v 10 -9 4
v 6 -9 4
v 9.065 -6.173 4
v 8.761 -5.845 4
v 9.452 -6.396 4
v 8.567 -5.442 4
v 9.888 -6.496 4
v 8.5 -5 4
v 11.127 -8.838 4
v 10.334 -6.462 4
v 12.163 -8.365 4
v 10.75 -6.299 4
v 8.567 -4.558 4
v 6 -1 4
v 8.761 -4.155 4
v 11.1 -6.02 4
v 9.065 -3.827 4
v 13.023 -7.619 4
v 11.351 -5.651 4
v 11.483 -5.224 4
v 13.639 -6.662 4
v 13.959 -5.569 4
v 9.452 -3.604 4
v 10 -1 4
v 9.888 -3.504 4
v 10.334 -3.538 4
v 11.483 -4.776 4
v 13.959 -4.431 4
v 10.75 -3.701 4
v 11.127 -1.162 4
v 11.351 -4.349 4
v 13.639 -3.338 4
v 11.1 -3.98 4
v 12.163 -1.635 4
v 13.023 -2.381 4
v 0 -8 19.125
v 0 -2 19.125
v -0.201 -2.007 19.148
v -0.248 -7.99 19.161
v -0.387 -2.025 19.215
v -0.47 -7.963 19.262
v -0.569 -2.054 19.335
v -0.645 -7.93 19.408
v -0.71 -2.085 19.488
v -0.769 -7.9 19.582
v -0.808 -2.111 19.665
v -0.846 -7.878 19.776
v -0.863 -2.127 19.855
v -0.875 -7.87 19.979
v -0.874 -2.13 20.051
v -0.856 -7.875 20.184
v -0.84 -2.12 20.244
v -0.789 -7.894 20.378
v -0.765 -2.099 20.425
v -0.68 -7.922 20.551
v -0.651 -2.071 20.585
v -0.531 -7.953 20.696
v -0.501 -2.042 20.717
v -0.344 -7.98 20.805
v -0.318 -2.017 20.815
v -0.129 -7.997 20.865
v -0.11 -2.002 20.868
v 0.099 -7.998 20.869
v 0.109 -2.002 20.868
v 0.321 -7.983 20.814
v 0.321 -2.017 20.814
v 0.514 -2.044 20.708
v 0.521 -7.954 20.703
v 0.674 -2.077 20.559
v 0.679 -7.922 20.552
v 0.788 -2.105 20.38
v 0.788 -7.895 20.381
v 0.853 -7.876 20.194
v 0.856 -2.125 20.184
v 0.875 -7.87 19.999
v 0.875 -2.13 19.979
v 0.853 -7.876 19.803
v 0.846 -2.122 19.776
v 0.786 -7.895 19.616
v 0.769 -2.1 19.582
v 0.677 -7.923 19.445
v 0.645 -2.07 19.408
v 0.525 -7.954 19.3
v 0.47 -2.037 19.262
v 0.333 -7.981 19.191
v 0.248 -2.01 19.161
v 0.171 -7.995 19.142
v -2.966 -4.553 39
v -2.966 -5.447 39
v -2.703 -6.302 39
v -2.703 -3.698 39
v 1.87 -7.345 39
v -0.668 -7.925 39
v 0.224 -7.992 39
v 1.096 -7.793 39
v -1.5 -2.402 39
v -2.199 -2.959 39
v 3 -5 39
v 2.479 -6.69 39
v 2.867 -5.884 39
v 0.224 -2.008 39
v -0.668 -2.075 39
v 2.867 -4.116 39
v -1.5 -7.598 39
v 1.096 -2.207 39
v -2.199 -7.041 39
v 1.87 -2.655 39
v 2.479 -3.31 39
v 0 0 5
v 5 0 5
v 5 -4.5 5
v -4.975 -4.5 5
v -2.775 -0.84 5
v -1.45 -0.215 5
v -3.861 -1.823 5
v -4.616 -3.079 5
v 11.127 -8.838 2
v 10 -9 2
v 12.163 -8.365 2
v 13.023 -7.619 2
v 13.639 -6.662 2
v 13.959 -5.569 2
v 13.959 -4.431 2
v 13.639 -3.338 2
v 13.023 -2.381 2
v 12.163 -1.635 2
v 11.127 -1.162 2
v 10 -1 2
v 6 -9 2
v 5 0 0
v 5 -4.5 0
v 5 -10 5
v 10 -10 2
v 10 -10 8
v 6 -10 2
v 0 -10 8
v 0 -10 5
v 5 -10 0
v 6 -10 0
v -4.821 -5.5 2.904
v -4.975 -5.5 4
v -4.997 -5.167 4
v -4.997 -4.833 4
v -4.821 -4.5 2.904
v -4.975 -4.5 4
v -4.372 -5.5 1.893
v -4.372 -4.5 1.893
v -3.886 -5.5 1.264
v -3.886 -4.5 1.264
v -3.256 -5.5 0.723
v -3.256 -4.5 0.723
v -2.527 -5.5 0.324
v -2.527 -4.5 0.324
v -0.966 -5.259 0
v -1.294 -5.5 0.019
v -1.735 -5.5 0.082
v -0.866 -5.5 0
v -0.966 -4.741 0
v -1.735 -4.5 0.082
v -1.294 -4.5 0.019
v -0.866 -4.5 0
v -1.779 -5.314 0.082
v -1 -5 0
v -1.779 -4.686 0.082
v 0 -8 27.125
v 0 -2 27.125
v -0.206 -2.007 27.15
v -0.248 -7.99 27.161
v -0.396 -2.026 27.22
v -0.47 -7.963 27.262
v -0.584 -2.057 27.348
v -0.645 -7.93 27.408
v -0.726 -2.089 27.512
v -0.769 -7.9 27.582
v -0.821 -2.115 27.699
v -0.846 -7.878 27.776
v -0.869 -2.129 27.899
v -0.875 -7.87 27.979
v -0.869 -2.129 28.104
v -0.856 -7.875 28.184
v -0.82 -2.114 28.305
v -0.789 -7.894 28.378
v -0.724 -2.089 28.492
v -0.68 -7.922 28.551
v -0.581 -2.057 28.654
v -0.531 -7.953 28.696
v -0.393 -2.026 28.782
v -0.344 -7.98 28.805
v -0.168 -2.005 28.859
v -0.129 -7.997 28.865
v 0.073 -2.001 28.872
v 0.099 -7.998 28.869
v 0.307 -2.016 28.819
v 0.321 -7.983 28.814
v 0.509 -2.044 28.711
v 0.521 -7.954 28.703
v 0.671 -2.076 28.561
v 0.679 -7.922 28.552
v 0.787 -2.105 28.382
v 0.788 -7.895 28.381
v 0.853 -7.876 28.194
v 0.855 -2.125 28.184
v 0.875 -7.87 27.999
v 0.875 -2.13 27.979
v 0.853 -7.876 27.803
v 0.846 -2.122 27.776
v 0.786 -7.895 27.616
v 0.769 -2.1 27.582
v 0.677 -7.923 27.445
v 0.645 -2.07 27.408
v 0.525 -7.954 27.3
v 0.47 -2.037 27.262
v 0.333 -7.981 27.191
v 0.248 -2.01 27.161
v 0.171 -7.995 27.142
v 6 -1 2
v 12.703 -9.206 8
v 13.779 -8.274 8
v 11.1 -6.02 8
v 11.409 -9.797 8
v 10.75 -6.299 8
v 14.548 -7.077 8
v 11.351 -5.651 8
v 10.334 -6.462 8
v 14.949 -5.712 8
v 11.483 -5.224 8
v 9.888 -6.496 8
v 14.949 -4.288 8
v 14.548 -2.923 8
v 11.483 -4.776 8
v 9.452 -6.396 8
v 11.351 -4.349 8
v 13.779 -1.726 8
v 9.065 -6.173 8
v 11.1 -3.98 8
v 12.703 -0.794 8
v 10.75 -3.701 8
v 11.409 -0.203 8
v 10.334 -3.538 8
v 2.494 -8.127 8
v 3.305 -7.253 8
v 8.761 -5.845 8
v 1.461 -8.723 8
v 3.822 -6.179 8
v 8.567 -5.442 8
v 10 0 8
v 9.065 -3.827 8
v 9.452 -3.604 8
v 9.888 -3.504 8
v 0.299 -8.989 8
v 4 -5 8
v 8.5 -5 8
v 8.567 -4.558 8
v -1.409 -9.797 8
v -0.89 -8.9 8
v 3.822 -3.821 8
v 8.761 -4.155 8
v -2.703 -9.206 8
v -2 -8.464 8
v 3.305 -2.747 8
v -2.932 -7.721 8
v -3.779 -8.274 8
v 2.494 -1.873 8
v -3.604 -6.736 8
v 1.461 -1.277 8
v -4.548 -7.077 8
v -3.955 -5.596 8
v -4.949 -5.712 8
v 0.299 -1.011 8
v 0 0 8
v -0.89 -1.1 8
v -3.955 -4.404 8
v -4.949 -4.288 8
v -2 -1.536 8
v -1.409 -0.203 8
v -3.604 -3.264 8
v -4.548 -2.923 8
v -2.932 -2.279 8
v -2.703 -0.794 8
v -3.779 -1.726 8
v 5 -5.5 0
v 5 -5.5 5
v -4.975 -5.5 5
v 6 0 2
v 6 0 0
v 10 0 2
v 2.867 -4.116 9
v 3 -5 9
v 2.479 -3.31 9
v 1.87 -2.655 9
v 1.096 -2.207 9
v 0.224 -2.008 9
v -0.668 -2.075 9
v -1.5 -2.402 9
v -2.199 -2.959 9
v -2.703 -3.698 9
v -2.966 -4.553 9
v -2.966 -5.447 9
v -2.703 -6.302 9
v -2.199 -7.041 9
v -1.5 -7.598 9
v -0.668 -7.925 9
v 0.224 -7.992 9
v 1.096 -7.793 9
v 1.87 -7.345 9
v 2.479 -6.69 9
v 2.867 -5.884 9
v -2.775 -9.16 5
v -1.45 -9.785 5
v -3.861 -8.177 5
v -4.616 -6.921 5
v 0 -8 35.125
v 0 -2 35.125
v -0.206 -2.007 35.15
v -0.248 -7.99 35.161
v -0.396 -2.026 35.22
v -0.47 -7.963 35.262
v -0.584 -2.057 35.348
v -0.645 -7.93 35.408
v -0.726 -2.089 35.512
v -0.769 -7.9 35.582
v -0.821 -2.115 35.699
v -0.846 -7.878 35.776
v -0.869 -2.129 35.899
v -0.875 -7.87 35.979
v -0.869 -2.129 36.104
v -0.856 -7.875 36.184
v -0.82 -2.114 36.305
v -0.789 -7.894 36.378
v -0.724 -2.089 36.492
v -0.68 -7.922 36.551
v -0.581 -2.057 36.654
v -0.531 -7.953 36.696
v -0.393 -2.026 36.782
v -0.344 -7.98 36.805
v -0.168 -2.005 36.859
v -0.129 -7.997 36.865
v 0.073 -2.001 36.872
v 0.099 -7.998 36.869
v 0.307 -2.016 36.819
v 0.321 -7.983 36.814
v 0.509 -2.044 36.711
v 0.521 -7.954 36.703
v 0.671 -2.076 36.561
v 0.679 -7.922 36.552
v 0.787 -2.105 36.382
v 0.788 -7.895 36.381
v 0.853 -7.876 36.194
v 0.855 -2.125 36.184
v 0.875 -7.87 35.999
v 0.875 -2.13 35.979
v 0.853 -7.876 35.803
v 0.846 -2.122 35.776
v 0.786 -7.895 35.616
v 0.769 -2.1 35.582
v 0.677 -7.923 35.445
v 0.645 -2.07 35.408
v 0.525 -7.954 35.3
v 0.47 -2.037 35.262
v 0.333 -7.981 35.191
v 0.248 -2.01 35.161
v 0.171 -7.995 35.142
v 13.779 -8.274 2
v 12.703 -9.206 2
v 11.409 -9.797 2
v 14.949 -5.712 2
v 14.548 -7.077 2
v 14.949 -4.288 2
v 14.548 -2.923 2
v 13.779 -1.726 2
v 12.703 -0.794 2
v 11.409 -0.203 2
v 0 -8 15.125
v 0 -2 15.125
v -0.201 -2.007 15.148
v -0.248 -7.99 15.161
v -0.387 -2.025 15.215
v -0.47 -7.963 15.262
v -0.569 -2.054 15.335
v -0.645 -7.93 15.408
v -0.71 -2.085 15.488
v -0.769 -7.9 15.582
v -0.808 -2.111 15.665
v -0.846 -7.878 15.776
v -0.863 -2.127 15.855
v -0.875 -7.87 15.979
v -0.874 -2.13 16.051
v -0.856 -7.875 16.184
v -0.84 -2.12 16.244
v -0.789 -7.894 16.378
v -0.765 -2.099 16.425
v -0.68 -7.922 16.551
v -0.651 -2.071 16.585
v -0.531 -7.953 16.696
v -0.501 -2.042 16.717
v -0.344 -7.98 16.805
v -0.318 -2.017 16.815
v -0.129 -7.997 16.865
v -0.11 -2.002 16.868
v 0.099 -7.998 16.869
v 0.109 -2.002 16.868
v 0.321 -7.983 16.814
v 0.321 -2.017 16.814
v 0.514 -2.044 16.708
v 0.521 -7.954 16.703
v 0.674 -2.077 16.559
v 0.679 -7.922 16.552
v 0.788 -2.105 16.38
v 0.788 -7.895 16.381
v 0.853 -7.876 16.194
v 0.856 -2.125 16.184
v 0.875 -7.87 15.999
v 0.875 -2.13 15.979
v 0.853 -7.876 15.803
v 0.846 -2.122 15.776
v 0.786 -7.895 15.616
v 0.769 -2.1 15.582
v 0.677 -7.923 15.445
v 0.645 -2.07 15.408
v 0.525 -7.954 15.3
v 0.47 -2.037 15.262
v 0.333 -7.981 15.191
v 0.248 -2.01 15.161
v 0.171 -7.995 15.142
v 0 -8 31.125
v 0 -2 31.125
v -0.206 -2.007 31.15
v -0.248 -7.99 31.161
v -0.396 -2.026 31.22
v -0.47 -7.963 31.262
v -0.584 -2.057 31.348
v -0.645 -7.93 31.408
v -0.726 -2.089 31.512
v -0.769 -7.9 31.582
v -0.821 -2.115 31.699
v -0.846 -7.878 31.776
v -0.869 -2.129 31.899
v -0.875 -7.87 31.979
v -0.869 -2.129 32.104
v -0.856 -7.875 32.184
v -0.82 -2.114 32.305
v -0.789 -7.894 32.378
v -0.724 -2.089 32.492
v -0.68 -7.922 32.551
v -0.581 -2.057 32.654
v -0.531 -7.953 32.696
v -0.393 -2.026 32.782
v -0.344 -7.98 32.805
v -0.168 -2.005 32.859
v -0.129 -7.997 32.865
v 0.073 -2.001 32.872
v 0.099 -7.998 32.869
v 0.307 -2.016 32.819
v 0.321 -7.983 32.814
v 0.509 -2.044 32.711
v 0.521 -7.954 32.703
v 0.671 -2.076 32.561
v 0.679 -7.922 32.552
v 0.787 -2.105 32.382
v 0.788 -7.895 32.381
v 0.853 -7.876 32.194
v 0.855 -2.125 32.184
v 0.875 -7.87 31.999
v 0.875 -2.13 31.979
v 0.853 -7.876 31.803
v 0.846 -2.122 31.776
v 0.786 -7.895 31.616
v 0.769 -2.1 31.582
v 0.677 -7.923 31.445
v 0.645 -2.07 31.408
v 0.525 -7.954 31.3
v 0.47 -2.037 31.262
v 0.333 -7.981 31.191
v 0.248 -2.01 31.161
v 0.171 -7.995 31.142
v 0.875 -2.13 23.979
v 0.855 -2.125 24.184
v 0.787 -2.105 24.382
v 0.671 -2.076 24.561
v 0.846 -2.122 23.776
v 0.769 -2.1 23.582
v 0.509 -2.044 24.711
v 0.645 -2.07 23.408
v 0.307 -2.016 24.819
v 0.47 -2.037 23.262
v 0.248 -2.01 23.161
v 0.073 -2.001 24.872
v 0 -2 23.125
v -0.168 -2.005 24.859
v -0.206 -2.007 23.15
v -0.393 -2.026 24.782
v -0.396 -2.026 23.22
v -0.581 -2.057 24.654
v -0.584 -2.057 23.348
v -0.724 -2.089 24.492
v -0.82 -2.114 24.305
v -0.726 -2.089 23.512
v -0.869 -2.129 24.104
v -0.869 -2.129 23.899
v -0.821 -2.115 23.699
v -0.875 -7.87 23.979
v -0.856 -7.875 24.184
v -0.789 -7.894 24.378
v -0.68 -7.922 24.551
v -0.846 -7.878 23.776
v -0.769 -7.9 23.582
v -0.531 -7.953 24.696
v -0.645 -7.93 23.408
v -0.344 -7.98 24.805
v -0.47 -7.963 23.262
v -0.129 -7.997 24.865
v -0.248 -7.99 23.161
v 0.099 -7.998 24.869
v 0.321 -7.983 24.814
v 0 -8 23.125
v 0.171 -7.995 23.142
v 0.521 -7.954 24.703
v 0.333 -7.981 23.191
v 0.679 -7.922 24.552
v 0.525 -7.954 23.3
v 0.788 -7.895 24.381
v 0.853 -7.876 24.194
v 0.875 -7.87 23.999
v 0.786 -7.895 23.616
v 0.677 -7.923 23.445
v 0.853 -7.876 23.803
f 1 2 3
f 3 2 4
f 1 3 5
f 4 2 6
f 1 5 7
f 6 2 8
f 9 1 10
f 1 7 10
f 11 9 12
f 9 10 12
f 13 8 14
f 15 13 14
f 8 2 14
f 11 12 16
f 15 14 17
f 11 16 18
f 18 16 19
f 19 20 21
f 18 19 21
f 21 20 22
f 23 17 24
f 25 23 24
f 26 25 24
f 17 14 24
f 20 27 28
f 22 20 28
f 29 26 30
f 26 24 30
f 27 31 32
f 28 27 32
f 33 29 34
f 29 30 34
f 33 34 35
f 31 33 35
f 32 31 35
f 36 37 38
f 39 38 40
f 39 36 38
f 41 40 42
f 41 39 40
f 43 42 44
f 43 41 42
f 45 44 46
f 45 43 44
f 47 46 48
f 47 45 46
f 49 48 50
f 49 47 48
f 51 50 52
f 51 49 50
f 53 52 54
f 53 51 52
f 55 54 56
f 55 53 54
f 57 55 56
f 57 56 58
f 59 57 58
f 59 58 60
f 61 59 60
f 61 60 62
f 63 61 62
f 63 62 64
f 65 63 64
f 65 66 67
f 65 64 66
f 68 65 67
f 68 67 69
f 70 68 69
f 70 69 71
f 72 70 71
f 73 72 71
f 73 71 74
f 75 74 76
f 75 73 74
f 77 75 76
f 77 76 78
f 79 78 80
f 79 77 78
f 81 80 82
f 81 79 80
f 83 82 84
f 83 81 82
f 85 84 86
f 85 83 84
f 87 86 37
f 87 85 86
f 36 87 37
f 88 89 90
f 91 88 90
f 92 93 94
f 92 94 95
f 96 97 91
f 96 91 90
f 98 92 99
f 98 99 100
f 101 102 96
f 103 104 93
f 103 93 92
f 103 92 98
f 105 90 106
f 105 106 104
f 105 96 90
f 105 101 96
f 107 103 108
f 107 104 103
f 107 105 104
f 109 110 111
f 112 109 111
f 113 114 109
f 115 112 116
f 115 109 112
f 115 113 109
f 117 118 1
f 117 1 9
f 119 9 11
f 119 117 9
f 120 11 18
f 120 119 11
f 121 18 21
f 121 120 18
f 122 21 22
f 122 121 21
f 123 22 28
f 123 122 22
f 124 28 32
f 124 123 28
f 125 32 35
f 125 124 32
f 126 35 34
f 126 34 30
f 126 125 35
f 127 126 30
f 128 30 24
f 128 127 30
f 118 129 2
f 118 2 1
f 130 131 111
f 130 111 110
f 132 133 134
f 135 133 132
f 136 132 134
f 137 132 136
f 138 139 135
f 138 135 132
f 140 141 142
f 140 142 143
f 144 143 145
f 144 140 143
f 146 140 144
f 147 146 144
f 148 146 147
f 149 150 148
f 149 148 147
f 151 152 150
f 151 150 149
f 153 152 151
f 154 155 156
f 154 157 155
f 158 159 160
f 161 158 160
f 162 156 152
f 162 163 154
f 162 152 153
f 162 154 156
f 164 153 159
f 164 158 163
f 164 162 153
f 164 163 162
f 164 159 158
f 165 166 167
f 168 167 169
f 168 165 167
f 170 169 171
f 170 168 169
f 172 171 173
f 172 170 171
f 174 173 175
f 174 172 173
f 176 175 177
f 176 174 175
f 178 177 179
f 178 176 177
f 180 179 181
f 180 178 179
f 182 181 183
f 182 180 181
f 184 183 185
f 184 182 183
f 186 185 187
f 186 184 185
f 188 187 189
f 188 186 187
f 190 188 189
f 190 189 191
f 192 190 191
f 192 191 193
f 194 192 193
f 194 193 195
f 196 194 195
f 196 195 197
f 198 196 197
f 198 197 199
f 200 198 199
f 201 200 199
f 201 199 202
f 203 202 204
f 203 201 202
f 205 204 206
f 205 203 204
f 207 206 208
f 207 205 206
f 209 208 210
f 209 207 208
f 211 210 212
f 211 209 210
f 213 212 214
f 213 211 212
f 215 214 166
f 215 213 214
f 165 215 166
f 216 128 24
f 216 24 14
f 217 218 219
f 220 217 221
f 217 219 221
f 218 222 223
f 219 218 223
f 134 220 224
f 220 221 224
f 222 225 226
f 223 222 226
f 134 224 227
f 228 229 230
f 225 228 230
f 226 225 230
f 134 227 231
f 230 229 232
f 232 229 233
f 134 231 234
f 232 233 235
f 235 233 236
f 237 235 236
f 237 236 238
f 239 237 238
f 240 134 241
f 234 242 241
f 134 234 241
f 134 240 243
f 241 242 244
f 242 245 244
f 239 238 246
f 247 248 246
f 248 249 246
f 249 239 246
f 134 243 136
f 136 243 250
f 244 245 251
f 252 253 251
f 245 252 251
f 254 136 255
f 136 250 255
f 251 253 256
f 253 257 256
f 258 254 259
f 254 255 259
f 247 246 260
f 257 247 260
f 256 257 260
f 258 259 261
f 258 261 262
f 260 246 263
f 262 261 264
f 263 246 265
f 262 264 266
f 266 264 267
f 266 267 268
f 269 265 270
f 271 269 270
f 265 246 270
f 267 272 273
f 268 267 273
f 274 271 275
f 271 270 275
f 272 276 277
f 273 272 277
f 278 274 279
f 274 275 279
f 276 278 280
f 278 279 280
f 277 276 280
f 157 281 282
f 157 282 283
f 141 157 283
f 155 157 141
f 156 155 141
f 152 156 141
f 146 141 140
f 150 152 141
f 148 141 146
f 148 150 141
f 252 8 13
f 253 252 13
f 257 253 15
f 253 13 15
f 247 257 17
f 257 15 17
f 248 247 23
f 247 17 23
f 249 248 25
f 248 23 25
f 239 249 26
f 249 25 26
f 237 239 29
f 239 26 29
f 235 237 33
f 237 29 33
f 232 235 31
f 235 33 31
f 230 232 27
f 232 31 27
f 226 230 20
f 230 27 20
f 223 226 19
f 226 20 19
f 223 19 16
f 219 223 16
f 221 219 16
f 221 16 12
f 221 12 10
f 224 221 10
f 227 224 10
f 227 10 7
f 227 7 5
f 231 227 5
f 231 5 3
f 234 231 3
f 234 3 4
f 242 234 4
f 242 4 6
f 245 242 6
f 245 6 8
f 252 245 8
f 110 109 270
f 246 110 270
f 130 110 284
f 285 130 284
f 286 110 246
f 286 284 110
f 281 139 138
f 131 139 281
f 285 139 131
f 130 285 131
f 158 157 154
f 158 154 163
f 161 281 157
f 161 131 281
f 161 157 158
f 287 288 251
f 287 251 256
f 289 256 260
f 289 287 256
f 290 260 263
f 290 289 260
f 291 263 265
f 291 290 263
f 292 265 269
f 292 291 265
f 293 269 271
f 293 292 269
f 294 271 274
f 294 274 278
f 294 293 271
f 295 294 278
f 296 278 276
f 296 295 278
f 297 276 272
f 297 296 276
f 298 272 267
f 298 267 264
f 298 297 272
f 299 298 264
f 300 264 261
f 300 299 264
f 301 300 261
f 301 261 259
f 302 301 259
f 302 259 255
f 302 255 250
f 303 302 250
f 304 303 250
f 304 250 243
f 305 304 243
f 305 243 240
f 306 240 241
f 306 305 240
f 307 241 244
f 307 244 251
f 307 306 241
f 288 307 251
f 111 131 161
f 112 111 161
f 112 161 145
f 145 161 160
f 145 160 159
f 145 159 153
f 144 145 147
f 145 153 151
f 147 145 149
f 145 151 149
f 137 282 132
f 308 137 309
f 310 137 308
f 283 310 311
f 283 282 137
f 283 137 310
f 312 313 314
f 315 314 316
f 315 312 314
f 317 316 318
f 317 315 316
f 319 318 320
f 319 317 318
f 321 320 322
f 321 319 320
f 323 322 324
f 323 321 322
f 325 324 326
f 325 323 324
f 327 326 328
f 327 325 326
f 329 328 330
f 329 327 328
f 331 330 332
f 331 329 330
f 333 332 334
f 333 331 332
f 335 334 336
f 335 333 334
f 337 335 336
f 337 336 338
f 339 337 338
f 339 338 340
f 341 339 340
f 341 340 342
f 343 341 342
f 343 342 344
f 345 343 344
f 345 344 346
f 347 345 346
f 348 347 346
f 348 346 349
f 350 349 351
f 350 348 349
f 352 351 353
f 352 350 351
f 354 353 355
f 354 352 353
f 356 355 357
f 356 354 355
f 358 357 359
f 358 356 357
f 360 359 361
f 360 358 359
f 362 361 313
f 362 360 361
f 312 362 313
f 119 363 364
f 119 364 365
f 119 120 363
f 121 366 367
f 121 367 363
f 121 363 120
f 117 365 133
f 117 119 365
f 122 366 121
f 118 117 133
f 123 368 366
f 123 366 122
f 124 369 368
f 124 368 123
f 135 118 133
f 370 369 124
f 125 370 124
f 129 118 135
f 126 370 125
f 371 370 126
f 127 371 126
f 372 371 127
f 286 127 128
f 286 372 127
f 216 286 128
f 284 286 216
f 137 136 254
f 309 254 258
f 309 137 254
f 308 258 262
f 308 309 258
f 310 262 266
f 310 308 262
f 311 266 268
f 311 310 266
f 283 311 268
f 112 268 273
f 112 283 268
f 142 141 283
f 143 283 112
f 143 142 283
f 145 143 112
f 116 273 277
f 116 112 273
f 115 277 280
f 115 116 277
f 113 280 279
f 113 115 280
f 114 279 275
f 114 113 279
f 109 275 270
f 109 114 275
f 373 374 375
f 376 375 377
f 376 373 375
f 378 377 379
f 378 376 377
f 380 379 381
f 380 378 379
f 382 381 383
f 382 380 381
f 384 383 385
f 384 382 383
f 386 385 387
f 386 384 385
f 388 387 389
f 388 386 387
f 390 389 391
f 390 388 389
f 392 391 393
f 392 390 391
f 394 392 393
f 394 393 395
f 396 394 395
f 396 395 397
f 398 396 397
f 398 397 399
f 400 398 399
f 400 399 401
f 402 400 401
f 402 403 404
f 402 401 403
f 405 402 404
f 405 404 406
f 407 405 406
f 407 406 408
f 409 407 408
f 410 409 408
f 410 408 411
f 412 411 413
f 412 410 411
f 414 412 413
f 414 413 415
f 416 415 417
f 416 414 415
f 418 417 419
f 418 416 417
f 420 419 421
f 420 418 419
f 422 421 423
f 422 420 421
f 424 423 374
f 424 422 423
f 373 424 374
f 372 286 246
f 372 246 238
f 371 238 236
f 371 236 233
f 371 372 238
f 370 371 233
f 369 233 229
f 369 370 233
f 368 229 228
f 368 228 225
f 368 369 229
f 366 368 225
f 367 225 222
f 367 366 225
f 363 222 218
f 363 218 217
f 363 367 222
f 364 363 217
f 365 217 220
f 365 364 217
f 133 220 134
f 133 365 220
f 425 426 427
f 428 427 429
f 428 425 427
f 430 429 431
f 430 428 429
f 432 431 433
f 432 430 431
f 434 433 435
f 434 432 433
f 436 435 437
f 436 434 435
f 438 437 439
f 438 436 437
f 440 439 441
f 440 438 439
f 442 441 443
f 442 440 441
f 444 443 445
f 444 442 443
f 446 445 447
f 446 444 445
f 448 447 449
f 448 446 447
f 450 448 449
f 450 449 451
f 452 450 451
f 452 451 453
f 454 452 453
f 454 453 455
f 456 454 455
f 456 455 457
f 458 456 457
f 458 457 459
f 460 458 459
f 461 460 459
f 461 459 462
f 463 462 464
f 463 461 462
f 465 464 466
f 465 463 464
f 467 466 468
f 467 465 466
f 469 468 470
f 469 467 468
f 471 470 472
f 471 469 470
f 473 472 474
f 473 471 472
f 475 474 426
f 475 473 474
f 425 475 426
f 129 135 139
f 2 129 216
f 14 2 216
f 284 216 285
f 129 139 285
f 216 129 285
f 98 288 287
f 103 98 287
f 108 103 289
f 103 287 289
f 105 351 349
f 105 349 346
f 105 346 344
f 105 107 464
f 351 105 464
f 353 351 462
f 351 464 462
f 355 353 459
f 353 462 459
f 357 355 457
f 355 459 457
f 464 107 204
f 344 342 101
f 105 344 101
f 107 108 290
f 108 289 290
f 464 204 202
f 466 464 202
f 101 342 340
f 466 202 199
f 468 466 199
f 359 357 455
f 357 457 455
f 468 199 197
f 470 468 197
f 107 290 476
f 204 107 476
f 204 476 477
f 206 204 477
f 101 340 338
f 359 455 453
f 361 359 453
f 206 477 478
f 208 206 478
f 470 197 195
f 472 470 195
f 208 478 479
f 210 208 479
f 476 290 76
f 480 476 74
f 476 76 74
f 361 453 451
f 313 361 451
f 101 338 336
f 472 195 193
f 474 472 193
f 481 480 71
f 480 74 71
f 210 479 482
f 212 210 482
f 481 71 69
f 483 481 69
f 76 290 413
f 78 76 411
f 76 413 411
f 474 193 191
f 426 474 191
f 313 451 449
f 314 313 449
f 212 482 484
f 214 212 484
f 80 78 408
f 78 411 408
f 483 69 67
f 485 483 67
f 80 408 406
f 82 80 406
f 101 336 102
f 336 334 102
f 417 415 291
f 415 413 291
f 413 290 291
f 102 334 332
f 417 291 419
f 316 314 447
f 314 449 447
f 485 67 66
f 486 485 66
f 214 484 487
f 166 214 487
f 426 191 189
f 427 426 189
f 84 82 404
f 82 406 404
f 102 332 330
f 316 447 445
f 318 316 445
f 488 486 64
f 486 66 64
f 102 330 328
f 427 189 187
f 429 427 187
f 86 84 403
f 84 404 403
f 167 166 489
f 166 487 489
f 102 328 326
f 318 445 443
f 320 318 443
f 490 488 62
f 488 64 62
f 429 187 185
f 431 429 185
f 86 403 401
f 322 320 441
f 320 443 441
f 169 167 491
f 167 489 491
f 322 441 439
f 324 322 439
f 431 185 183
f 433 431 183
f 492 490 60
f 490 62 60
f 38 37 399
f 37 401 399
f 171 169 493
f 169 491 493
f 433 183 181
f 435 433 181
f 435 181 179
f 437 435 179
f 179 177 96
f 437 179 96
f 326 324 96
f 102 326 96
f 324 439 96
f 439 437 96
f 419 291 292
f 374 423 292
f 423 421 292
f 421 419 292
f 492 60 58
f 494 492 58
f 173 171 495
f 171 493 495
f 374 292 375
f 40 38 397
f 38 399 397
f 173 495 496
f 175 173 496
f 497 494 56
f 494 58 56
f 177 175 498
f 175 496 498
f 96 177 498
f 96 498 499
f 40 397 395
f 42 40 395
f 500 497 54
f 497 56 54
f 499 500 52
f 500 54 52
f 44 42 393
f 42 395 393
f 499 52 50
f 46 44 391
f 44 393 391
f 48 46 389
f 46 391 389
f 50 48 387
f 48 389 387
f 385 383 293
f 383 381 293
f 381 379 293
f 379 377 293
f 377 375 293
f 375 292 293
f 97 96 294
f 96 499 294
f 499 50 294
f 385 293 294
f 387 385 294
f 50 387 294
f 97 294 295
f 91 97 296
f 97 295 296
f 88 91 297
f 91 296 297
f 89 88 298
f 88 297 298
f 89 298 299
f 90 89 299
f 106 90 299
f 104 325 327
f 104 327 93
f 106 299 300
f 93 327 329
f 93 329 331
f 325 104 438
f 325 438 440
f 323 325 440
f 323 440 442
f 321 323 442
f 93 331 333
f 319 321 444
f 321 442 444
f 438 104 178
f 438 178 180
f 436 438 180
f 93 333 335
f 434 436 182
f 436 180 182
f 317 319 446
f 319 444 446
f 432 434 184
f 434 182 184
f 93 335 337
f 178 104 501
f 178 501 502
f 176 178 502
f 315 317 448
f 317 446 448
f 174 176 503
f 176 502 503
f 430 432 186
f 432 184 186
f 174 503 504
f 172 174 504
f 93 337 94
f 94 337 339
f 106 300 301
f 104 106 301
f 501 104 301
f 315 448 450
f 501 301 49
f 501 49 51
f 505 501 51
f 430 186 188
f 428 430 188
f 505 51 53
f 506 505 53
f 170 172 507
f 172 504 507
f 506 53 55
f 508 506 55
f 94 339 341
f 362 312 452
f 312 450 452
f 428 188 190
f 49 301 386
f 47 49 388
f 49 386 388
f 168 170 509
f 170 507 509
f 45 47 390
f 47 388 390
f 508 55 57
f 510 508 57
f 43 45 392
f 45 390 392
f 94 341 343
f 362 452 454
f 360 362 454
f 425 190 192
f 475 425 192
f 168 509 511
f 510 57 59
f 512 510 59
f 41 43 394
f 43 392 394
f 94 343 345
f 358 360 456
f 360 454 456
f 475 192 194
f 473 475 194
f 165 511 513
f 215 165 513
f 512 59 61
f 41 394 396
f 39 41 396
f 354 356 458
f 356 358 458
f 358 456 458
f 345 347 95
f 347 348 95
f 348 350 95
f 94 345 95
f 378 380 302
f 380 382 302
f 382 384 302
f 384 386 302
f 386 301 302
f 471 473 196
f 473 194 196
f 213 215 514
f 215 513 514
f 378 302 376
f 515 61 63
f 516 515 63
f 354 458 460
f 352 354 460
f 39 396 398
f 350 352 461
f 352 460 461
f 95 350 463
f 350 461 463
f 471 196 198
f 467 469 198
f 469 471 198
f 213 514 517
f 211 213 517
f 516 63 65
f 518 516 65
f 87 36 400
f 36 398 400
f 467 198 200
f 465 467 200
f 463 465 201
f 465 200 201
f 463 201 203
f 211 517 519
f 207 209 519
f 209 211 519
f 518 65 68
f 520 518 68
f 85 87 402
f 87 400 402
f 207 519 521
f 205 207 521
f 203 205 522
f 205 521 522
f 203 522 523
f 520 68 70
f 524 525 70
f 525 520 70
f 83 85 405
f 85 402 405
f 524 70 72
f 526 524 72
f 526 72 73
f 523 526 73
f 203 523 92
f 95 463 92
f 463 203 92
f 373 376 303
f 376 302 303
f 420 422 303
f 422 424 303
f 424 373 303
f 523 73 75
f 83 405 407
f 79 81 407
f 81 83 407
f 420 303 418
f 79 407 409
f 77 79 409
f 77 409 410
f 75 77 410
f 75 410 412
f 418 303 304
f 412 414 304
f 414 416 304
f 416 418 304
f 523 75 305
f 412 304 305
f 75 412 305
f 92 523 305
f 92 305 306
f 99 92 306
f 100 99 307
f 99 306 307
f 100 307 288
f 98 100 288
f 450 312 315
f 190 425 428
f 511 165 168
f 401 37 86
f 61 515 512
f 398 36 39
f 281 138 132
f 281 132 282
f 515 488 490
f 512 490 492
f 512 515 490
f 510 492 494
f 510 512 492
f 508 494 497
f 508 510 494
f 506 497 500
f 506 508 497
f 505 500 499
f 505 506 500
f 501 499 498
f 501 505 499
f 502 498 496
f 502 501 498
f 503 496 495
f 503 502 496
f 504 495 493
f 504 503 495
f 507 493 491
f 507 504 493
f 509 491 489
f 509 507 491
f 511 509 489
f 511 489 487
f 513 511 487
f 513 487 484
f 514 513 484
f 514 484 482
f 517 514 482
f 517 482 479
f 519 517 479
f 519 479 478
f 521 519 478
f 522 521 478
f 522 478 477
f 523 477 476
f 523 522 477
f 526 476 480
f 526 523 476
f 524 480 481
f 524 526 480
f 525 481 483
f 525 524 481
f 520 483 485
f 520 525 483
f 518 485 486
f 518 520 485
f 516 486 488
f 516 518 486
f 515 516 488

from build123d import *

# Parameters (mm, degrees)
VYSUNOUT1_DEPTH          = 8
SKICA2_R                 = 3
VYSUNOUT2_DEPTH          = 31
M3_Z_VITOV_D_RY1_D       = 3
ZKOSIT1_SIZE             = 1
SKICA5_W                 = 10.533076429
SKICA5_H                 = 13.637336759
ODEBRAT_VYSUNUT_M1_DEPTH = 2
ODEBRAT_VYSUNUT_M2_DEPTH = 2
SKICA7_W                 = 10.597302505
SKICA7_H                 = 5.566259902
ODEBRAT_VYSUNUT_M3_DEPTH = 5
ZAOBLIT1_R               = 4
SKICA8_R                 = 0.875
ODEBRAT_VYSUNUT_M4_DEPTH = 6
LINPOLE1_COUNT           = 6
LINPOLE1_PITCH           = 4
LINPOLE1_COUNT_DIR2      = 4
LINPOLE1_PITCH_DIR2      = 50


with BuildPart() as part:
    # Skica1 → Vysunout1 (new body)
    with BuildSketch(Plane.XY):
        with BuildLine():
            Line((0, 0), (10, 0))
            ThreePointArc((10, 0), (15, -5), (10, -10))
            Line((10, -10), (0, -10))
            ThreePointArc((0, -10), (-5, -5), (0, 0))
        make_face()
    extrude(amount=VYSUNOUT1_DEPTH)

    # Skica2 → Vysunout2 (add)
    with BuildSketch(Plane.XY.offset(8)):
        with Locations((0, -5)):
            Circle(SKICA2_R)
    extrude(amount=VYSUNOUT2_DEPTH)

    # M3 závitové díry1 (through all)
    with Locations(Plane.XY.offset(8)):
        with Locations((10, -5)):
            Hole(M3_Z_VITOV_D_RY1_D / 2)

    # Zkosit1
    zkosit1_edges = [part.edges().sort_by_distance(p)[0] for p in [
        (-3, -5, 8),
    ]]
    chamfer(zkosit1_edges, length=ZKOSIT1_SIZE)

    # Skica5 → Odebrat vysunutím1 (cut)
    with BuildSketch(Plane(origin=(0, 0, 0), x_dir=(-1, 0, 0), z_dir=(0, 0, -1))):
        with Locations((-11.266538215, -4.925069579)):
            Rectangle(SKICA5_W, SKICA5_H)
    extrude(amount=-ODEBRAT_VYSUNUT_M1_DEPTH, mode=Mode.SUBTRACT)

    # Skica6 → Odebrat vysunutím2 (cut)
    with BuildSketch(Plane(origin=(0, 0, 2), x_dir=(-1, 0, 0), z_dir=(0, 0, -1))):
        with BuildLine():
            Line((-6, -1), (-6, -9))
            Line((-6, -9), (-10, -9))
            ThreePointArc((-10, -9), (-14, -5), (-10, -1))
            Line((-10, -1), (-6, -1))
        make_face()
    extrude(amount=-ODEBRAT_VYSUNUT_M2_DEPTH, mode=Mode.SUBTRACT)

    # Skica7 → Odebrat vysunutím3 (cut)
    with BuildSketch(Plane(origin=(0, 0, 0), x_dir=(-1, 0, 0), z_dir=(0, 0, -1))):
        with Locations((0.298651253, -1.716870049)):
            Rectangle(SKICA7_W, SKICA7_H)
        with Locations((0.298651253, -8.283129951)):
            Rectangle(SKICA7_W, SKICA7_H)
    extrude(amount=-ODEBRAT_VYSUNUT_M3_DEPTH, mode=Mode.SUBTRACT)

    # Zaoblit1
    zaoblit1_edges = [part.edges().sort_by_distance(p)[0] for p in [
        (-5, -5, 0),
    ]]
    fillet(zaoblit1_edges, radius=ZAOBLIT1_R)

    # Skica8 → Odebrat vysunutím4 (cut)
    with BuildSketch(Plane(origin=(0, -8, 0), x_dir=(-1, 0, 0), z_dir=(0, 1, 0))):
        with Locations(Location((0, 36, 0), (0, 0, 270))):  # turned: the seam where the file's is
            Circle(SKICA8_R)
    odebrat_vysunut_m4 = extrude(amount=ODEBRAT_VYSUNUT_M4_DEPTH, mode=Mode.SUBTRACT)

    # LinPole1: Odebrat vysunut_m4 6 × 4
    with Locations(*[Vector(0, 0, -1) * (i * LINPOLE1_PITCH) + Vector(0, 0, -1) * (j * LINPOLE1_PITCH_DIR2) for i in range(LINPOLE1_COUNT) for j in range(LINPOLE1_COUNT_DIR2) if (i, j) != (0, 0)]):
        add(odebrat_vysunut_m4, mode=Mode.SUBTRACT)


solid = part.part
